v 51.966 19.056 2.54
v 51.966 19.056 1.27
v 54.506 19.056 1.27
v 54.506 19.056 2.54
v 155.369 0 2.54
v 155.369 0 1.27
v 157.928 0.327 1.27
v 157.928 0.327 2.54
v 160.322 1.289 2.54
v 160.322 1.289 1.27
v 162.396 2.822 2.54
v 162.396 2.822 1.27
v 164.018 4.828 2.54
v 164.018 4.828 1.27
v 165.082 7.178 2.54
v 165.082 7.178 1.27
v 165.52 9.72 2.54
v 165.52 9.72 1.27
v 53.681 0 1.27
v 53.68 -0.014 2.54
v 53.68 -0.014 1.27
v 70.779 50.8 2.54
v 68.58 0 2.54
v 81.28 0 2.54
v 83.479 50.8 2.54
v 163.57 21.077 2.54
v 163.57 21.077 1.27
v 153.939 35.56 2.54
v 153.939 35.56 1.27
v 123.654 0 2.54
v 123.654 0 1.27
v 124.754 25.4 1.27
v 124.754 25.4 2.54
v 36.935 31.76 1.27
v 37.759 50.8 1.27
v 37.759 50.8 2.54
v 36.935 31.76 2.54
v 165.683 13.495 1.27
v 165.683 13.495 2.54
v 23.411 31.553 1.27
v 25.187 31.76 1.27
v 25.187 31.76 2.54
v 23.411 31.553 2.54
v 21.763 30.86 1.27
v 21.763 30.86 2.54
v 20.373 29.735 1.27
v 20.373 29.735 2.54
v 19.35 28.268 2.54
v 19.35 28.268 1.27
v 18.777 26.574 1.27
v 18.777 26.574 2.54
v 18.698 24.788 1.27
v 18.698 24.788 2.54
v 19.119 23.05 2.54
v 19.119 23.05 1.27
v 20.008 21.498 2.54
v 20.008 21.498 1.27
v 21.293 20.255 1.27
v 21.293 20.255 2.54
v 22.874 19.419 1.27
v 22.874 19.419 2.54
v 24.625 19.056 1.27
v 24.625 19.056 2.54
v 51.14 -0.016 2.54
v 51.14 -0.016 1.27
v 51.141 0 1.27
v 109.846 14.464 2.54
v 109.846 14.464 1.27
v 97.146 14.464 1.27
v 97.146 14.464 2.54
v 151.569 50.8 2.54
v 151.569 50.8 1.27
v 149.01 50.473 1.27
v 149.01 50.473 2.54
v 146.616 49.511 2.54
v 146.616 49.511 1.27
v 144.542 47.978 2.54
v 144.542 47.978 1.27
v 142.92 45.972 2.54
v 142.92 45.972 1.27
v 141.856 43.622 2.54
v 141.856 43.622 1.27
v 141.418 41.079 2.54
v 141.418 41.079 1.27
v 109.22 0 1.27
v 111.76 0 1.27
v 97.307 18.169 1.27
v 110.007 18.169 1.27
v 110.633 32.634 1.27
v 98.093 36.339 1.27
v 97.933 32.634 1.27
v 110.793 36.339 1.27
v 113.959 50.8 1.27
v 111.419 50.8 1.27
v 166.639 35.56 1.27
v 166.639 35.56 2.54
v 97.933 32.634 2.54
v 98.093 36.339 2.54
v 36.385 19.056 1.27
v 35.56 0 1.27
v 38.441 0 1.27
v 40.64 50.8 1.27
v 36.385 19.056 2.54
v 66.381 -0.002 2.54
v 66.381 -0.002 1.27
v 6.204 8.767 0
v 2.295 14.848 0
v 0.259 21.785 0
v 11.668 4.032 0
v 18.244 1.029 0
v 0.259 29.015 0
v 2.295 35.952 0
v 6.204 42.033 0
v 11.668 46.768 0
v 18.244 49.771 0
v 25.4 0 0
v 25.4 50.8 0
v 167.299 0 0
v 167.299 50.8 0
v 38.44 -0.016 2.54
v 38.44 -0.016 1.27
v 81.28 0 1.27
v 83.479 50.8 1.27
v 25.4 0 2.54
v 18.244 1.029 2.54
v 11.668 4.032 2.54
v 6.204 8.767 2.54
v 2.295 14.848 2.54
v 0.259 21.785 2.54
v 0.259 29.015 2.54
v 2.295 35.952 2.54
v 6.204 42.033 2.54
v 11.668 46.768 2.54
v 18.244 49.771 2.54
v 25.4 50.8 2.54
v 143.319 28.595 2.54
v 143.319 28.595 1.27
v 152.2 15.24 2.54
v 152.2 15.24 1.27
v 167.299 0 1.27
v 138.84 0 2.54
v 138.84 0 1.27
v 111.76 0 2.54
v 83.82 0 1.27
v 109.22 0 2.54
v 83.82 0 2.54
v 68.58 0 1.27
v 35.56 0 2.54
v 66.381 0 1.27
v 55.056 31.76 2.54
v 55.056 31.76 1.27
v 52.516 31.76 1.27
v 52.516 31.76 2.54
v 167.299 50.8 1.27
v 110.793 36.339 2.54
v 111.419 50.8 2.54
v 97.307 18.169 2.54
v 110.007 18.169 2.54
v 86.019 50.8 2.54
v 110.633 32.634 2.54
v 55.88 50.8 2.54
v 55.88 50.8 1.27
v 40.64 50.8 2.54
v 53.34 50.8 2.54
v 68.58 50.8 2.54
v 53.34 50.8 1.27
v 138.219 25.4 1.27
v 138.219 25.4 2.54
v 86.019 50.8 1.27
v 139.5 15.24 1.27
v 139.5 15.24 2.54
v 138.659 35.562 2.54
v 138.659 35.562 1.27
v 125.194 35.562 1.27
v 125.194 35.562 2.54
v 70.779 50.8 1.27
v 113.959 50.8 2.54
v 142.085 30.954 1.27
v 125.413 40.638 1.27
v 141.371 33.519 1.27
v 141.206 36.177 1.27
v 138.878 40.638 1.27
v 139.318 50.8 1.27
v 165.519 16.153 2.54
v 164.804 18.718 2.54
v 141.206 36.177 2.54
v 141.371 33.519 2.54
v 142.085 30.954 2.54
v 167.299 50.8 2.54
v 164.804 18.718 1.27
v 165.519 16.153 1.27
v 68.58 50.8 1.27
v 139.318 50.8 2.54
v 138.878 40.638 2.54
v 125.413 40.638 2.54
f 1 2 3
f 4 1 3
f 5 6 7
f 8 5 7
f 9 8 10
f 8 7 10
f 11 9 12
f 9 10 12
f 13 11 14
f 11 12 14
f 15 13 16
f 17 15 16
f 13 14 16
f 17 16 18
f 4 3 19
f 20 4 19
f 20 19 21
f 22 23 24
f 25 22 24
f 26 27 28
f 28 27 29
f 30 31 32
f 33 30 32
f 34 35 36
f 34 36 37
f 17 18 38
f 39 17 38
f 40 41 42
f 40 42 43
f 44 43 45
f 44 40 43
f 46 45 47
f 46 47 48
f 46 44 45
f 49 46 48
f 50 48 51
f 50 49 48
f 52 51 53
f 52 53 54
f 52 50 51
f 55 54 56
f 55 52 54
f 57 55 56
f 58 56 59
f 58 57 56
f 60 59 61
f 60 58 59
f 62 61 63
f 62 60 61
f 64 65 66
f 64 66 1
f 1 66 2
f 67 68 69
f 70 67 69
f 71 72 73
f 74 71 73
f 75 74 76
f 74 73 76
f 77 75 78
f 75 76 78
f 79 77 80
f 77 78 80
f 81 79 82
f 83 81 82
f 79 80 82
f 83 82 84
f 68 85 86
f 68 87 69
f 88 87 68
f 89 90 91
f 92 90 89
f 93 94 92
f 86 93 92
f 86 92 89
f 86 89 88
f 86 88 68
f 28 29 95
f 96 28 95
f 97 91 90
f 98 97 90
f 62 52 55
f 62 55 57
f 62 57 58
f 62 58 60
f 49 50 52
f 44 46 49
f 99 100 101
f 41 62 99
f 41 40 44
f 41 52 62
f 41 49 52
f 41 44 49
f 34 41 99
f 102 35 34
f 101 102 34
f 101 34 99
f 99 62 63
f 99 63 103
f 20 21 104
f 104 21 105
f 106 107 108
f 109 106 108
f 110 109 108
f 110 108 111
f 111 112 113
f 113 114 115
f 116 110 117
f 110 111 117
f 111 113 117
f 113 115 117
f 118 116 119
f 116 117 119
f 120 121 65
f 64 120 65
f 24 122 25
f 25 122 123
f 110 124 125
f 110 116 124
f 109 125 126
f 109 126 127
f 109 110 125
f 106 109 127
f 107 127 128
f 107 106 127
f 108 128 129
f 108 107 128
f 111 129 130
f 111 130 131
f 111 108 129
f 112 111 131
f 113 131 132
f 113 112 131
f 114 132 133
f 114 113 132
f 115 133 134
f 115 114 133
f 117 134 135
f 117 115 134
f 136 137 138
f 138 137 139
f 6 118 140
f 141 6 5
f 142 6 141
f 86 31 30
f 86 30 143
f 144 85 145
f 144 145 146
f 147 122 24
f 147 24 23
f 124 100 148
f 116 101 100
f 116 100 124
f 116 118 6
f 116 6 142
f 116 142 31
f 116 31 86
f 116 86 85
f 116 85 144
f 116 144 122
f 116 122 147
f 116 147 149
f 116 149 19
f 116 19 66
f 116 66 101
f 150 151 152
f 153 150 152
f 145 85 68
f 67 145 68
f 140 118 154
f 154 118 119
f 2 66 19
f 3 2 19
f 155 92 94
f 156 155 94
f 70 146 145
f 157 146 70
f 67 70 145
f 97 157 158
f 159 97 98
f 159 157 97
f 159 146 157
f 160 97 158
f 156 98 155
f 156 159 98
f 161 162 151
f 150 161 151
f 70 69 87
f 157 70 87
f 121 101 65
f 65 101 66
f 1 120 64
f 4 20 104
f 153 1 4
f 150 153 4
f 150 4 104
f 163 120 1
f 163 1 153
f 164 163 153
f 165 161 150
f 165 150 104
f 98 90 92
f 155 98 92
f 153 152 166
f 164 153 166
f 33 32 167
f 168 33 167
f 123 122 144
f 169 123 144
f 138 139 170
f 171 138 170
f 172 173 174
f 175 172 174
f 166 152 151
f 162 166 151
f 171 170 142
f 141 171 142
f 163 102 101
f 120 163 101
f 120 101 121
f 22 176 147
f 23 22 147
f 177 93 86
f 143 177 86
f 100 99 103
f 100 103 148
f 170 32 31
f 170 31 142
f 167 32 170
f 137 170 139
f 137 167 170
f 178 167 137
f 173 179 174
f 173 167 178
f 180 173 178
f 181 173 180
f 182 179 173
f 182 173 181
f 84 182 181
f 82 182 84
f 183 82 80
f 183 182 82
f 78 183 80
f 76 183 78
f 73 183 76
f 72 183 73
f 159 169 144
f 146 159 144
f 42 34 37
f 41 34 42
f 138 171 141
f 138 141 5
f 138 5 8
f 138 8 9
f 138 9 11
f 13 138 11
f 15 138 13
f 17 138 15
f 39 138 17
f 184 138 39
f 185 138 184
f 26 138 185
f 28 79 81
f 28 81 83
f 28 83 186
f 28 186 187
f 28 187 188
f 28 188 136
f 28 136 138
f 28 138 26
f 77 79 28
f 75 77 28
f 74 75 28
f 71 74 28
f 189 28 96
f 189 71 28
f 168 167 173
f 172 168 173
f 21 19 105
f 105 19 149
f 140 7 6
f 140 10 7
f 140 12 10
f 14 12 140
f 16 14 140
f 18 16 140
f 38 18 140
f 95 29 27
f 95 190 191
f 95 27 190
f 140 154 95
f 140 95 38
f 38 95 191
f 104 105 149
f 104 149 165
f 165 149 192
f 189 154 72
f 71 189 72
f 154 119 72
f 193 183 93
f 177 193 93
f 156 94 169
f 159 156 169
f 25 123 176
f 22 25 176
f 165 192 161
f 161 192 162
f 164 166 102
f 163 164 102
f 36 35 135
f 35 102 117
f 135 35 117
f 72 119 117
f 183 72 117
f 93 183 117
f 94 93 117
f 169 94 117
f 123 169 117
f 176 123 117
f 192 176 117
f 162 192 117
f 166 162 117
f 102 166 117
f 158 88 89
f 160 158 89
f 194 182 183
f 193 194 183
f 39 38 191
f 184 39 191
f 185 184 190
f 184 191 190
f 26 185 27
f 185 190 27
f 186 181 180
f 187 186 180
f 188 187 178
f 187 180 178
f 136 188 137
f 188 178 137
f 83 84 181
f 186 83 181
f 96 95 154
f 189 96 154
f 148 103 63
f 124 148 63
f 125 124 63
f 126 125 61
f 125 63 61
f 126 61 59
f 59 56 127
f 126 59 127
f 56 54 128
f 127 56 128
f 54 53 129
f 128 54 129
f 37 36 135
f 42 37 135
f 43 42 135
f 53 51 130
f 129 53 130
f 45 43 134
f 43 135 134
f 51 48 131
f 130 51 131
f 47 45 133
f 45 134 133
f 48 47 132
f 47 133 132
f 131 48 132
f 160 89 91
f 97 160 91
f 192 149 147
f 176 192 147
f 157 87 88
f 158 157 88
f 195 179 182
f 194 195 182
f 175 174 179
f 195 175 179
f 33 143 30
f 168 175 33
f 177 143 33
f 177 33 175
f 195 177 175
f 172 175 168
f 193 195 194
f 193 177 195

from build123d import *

# Parameters (mm, degrees)
EXTRUDE2_DEPTH = 1.27
EXTRUDE3_DEPTH = 1.27
EXTRUDE4_DEPTH = 1.27


with BuildPart() as part:
    # Sketch2 → Extrude2 (new body)
    with BuildSketch(Plane.XY):
        with BuildLine():
            Line((25.4, 0), (167.299096948, 0))
            Line((167.299096948, 0), (167.299096948, 50.8))
            Line((167.299096948, 50.8), (25.4, 50.8))
            ThreePointArc((25.4, 50.8), (0, 25.4), (25.4, 0))
        make_face()
    extrude(amount=EXTRUDE2_DEPTH)

    # Sketch5 → Extrude3 (add)
    with BuildSketch(Plane.XY.offset(1.27)):
        with BuildLine():
            Line((25.4, 50.8), (37.759096935, 50.8))
            Line((37.759096935, 50.8), (36.934864936, 31.759918178))
            Line((36.934864936, 31.759918178), (25.187364936, 31.759918178))
            ThreePointArc((25.187364936, 31.759918178), (18.674313706, 25.683931539), (24.624718961, 19.055950907))
            Line((24.624718961, 19.055950907), (36.384918961, 19.055950907))
            Line((36.384918961, 19.055950907), (35.56, 0))
            Line((35.56, 0), (25.4, 0))
            ThreePointArc((25.4, 0), (0, 25.4), (25.4, 50.8))
        make_face()
    extrude(amount=EXTRUDE3_DEPTH)

    # Sketch5<4> → Extrude4 (add)
    with BuildSketch(Plane.XY.offset(1.27)):
        with BuildLine():
            Line((153.939033989, 35.56), (166.639033989, 35.56))
            Line((166.639033989, 35.56), (167.299096935, 50.8))
            Line((167.299096935, 50.8), (151.568912005, 50.8))
            ThreePointArc((151.568912005, 50.8), (144.541778303, 47.977914686), (141.418418385, 41.079407862))
            Line((141.418418385, 41.079407862), (141.206176472, 36.176536601))
            ThreePointArc((141.206176472, 36.176536601), (141.660521084, 32.217758839), (143.31923128, 28.594634375))
            Line((143.31923128, 28.594634375), (152.200348571, 15.24))
            Line((152.200348571, 15.24), (139.500348571, 15.24))
            Line((139.500348571, 15.24), (138.840285624, 0))
            Line((138.840285624, 0), (155.369404166, 0))
            ThreePointArc((155.369404166, 0), (162.396457641, 2.822008486), (165.519888176, 9.720370185))
            Line((165.519888176, 9.720370185), (165.683377481, 13.495126865))
            ThreePointArc((165.683377481, 13.495126865), (165.229082159, 17.454048315), (163.570334687, 21.077306532))
            Line((163.570334687, 21.077306532), (153.939033989, 35.56))
        make_face()
        Polygon((53.34, 50.8), (40.64, 50.8), (38.440216103, -0.015869084), (51.140216103, -0.015869084), (51.965822026, 19.055950907), (54.505822026, 19.055950907), (53.680316159, -0.013557756), (66.380816438, -0.002001116), (68.58, 50.8), (55.88, 50.8), (55.055768, 31.759918178), (52.515768, 31.759918178), align=None)
        Polygon((83.479096935, 50.8), (70.779096935, 50.8), (68.58, 0), (81.28, 0), align=None)
        Polygon((111.419096935, 50.8), (86.019096935, 50.8), (83.82, 0), (109.22, 0), (109.846156204, 14.464453409), (97.146156204, 14.464453409), (97.306540074, 18.16938358), (110.006540074, 18.16938358), (110.632696278, 32.633836988), (97.932696278, 32.633836988), (98.093080148, 36.33876716), (110.793080148, 36.33876716), align=None)
        Polygon((139.318340653, 50.8), (113.959096935, 50.8), (111.76, 0), (123.65404294, 0), (124.753591407, 25.4), (138.218792185, 25.4), (138.658714454, 35.562376595), (125.193513676, 35.562376595), (125.413217607, 40.637623405), (138.878418385, 40.637623405), align=None)
    extrude(amount=EXTRUDE4_DEPTH)


solid = part.part
